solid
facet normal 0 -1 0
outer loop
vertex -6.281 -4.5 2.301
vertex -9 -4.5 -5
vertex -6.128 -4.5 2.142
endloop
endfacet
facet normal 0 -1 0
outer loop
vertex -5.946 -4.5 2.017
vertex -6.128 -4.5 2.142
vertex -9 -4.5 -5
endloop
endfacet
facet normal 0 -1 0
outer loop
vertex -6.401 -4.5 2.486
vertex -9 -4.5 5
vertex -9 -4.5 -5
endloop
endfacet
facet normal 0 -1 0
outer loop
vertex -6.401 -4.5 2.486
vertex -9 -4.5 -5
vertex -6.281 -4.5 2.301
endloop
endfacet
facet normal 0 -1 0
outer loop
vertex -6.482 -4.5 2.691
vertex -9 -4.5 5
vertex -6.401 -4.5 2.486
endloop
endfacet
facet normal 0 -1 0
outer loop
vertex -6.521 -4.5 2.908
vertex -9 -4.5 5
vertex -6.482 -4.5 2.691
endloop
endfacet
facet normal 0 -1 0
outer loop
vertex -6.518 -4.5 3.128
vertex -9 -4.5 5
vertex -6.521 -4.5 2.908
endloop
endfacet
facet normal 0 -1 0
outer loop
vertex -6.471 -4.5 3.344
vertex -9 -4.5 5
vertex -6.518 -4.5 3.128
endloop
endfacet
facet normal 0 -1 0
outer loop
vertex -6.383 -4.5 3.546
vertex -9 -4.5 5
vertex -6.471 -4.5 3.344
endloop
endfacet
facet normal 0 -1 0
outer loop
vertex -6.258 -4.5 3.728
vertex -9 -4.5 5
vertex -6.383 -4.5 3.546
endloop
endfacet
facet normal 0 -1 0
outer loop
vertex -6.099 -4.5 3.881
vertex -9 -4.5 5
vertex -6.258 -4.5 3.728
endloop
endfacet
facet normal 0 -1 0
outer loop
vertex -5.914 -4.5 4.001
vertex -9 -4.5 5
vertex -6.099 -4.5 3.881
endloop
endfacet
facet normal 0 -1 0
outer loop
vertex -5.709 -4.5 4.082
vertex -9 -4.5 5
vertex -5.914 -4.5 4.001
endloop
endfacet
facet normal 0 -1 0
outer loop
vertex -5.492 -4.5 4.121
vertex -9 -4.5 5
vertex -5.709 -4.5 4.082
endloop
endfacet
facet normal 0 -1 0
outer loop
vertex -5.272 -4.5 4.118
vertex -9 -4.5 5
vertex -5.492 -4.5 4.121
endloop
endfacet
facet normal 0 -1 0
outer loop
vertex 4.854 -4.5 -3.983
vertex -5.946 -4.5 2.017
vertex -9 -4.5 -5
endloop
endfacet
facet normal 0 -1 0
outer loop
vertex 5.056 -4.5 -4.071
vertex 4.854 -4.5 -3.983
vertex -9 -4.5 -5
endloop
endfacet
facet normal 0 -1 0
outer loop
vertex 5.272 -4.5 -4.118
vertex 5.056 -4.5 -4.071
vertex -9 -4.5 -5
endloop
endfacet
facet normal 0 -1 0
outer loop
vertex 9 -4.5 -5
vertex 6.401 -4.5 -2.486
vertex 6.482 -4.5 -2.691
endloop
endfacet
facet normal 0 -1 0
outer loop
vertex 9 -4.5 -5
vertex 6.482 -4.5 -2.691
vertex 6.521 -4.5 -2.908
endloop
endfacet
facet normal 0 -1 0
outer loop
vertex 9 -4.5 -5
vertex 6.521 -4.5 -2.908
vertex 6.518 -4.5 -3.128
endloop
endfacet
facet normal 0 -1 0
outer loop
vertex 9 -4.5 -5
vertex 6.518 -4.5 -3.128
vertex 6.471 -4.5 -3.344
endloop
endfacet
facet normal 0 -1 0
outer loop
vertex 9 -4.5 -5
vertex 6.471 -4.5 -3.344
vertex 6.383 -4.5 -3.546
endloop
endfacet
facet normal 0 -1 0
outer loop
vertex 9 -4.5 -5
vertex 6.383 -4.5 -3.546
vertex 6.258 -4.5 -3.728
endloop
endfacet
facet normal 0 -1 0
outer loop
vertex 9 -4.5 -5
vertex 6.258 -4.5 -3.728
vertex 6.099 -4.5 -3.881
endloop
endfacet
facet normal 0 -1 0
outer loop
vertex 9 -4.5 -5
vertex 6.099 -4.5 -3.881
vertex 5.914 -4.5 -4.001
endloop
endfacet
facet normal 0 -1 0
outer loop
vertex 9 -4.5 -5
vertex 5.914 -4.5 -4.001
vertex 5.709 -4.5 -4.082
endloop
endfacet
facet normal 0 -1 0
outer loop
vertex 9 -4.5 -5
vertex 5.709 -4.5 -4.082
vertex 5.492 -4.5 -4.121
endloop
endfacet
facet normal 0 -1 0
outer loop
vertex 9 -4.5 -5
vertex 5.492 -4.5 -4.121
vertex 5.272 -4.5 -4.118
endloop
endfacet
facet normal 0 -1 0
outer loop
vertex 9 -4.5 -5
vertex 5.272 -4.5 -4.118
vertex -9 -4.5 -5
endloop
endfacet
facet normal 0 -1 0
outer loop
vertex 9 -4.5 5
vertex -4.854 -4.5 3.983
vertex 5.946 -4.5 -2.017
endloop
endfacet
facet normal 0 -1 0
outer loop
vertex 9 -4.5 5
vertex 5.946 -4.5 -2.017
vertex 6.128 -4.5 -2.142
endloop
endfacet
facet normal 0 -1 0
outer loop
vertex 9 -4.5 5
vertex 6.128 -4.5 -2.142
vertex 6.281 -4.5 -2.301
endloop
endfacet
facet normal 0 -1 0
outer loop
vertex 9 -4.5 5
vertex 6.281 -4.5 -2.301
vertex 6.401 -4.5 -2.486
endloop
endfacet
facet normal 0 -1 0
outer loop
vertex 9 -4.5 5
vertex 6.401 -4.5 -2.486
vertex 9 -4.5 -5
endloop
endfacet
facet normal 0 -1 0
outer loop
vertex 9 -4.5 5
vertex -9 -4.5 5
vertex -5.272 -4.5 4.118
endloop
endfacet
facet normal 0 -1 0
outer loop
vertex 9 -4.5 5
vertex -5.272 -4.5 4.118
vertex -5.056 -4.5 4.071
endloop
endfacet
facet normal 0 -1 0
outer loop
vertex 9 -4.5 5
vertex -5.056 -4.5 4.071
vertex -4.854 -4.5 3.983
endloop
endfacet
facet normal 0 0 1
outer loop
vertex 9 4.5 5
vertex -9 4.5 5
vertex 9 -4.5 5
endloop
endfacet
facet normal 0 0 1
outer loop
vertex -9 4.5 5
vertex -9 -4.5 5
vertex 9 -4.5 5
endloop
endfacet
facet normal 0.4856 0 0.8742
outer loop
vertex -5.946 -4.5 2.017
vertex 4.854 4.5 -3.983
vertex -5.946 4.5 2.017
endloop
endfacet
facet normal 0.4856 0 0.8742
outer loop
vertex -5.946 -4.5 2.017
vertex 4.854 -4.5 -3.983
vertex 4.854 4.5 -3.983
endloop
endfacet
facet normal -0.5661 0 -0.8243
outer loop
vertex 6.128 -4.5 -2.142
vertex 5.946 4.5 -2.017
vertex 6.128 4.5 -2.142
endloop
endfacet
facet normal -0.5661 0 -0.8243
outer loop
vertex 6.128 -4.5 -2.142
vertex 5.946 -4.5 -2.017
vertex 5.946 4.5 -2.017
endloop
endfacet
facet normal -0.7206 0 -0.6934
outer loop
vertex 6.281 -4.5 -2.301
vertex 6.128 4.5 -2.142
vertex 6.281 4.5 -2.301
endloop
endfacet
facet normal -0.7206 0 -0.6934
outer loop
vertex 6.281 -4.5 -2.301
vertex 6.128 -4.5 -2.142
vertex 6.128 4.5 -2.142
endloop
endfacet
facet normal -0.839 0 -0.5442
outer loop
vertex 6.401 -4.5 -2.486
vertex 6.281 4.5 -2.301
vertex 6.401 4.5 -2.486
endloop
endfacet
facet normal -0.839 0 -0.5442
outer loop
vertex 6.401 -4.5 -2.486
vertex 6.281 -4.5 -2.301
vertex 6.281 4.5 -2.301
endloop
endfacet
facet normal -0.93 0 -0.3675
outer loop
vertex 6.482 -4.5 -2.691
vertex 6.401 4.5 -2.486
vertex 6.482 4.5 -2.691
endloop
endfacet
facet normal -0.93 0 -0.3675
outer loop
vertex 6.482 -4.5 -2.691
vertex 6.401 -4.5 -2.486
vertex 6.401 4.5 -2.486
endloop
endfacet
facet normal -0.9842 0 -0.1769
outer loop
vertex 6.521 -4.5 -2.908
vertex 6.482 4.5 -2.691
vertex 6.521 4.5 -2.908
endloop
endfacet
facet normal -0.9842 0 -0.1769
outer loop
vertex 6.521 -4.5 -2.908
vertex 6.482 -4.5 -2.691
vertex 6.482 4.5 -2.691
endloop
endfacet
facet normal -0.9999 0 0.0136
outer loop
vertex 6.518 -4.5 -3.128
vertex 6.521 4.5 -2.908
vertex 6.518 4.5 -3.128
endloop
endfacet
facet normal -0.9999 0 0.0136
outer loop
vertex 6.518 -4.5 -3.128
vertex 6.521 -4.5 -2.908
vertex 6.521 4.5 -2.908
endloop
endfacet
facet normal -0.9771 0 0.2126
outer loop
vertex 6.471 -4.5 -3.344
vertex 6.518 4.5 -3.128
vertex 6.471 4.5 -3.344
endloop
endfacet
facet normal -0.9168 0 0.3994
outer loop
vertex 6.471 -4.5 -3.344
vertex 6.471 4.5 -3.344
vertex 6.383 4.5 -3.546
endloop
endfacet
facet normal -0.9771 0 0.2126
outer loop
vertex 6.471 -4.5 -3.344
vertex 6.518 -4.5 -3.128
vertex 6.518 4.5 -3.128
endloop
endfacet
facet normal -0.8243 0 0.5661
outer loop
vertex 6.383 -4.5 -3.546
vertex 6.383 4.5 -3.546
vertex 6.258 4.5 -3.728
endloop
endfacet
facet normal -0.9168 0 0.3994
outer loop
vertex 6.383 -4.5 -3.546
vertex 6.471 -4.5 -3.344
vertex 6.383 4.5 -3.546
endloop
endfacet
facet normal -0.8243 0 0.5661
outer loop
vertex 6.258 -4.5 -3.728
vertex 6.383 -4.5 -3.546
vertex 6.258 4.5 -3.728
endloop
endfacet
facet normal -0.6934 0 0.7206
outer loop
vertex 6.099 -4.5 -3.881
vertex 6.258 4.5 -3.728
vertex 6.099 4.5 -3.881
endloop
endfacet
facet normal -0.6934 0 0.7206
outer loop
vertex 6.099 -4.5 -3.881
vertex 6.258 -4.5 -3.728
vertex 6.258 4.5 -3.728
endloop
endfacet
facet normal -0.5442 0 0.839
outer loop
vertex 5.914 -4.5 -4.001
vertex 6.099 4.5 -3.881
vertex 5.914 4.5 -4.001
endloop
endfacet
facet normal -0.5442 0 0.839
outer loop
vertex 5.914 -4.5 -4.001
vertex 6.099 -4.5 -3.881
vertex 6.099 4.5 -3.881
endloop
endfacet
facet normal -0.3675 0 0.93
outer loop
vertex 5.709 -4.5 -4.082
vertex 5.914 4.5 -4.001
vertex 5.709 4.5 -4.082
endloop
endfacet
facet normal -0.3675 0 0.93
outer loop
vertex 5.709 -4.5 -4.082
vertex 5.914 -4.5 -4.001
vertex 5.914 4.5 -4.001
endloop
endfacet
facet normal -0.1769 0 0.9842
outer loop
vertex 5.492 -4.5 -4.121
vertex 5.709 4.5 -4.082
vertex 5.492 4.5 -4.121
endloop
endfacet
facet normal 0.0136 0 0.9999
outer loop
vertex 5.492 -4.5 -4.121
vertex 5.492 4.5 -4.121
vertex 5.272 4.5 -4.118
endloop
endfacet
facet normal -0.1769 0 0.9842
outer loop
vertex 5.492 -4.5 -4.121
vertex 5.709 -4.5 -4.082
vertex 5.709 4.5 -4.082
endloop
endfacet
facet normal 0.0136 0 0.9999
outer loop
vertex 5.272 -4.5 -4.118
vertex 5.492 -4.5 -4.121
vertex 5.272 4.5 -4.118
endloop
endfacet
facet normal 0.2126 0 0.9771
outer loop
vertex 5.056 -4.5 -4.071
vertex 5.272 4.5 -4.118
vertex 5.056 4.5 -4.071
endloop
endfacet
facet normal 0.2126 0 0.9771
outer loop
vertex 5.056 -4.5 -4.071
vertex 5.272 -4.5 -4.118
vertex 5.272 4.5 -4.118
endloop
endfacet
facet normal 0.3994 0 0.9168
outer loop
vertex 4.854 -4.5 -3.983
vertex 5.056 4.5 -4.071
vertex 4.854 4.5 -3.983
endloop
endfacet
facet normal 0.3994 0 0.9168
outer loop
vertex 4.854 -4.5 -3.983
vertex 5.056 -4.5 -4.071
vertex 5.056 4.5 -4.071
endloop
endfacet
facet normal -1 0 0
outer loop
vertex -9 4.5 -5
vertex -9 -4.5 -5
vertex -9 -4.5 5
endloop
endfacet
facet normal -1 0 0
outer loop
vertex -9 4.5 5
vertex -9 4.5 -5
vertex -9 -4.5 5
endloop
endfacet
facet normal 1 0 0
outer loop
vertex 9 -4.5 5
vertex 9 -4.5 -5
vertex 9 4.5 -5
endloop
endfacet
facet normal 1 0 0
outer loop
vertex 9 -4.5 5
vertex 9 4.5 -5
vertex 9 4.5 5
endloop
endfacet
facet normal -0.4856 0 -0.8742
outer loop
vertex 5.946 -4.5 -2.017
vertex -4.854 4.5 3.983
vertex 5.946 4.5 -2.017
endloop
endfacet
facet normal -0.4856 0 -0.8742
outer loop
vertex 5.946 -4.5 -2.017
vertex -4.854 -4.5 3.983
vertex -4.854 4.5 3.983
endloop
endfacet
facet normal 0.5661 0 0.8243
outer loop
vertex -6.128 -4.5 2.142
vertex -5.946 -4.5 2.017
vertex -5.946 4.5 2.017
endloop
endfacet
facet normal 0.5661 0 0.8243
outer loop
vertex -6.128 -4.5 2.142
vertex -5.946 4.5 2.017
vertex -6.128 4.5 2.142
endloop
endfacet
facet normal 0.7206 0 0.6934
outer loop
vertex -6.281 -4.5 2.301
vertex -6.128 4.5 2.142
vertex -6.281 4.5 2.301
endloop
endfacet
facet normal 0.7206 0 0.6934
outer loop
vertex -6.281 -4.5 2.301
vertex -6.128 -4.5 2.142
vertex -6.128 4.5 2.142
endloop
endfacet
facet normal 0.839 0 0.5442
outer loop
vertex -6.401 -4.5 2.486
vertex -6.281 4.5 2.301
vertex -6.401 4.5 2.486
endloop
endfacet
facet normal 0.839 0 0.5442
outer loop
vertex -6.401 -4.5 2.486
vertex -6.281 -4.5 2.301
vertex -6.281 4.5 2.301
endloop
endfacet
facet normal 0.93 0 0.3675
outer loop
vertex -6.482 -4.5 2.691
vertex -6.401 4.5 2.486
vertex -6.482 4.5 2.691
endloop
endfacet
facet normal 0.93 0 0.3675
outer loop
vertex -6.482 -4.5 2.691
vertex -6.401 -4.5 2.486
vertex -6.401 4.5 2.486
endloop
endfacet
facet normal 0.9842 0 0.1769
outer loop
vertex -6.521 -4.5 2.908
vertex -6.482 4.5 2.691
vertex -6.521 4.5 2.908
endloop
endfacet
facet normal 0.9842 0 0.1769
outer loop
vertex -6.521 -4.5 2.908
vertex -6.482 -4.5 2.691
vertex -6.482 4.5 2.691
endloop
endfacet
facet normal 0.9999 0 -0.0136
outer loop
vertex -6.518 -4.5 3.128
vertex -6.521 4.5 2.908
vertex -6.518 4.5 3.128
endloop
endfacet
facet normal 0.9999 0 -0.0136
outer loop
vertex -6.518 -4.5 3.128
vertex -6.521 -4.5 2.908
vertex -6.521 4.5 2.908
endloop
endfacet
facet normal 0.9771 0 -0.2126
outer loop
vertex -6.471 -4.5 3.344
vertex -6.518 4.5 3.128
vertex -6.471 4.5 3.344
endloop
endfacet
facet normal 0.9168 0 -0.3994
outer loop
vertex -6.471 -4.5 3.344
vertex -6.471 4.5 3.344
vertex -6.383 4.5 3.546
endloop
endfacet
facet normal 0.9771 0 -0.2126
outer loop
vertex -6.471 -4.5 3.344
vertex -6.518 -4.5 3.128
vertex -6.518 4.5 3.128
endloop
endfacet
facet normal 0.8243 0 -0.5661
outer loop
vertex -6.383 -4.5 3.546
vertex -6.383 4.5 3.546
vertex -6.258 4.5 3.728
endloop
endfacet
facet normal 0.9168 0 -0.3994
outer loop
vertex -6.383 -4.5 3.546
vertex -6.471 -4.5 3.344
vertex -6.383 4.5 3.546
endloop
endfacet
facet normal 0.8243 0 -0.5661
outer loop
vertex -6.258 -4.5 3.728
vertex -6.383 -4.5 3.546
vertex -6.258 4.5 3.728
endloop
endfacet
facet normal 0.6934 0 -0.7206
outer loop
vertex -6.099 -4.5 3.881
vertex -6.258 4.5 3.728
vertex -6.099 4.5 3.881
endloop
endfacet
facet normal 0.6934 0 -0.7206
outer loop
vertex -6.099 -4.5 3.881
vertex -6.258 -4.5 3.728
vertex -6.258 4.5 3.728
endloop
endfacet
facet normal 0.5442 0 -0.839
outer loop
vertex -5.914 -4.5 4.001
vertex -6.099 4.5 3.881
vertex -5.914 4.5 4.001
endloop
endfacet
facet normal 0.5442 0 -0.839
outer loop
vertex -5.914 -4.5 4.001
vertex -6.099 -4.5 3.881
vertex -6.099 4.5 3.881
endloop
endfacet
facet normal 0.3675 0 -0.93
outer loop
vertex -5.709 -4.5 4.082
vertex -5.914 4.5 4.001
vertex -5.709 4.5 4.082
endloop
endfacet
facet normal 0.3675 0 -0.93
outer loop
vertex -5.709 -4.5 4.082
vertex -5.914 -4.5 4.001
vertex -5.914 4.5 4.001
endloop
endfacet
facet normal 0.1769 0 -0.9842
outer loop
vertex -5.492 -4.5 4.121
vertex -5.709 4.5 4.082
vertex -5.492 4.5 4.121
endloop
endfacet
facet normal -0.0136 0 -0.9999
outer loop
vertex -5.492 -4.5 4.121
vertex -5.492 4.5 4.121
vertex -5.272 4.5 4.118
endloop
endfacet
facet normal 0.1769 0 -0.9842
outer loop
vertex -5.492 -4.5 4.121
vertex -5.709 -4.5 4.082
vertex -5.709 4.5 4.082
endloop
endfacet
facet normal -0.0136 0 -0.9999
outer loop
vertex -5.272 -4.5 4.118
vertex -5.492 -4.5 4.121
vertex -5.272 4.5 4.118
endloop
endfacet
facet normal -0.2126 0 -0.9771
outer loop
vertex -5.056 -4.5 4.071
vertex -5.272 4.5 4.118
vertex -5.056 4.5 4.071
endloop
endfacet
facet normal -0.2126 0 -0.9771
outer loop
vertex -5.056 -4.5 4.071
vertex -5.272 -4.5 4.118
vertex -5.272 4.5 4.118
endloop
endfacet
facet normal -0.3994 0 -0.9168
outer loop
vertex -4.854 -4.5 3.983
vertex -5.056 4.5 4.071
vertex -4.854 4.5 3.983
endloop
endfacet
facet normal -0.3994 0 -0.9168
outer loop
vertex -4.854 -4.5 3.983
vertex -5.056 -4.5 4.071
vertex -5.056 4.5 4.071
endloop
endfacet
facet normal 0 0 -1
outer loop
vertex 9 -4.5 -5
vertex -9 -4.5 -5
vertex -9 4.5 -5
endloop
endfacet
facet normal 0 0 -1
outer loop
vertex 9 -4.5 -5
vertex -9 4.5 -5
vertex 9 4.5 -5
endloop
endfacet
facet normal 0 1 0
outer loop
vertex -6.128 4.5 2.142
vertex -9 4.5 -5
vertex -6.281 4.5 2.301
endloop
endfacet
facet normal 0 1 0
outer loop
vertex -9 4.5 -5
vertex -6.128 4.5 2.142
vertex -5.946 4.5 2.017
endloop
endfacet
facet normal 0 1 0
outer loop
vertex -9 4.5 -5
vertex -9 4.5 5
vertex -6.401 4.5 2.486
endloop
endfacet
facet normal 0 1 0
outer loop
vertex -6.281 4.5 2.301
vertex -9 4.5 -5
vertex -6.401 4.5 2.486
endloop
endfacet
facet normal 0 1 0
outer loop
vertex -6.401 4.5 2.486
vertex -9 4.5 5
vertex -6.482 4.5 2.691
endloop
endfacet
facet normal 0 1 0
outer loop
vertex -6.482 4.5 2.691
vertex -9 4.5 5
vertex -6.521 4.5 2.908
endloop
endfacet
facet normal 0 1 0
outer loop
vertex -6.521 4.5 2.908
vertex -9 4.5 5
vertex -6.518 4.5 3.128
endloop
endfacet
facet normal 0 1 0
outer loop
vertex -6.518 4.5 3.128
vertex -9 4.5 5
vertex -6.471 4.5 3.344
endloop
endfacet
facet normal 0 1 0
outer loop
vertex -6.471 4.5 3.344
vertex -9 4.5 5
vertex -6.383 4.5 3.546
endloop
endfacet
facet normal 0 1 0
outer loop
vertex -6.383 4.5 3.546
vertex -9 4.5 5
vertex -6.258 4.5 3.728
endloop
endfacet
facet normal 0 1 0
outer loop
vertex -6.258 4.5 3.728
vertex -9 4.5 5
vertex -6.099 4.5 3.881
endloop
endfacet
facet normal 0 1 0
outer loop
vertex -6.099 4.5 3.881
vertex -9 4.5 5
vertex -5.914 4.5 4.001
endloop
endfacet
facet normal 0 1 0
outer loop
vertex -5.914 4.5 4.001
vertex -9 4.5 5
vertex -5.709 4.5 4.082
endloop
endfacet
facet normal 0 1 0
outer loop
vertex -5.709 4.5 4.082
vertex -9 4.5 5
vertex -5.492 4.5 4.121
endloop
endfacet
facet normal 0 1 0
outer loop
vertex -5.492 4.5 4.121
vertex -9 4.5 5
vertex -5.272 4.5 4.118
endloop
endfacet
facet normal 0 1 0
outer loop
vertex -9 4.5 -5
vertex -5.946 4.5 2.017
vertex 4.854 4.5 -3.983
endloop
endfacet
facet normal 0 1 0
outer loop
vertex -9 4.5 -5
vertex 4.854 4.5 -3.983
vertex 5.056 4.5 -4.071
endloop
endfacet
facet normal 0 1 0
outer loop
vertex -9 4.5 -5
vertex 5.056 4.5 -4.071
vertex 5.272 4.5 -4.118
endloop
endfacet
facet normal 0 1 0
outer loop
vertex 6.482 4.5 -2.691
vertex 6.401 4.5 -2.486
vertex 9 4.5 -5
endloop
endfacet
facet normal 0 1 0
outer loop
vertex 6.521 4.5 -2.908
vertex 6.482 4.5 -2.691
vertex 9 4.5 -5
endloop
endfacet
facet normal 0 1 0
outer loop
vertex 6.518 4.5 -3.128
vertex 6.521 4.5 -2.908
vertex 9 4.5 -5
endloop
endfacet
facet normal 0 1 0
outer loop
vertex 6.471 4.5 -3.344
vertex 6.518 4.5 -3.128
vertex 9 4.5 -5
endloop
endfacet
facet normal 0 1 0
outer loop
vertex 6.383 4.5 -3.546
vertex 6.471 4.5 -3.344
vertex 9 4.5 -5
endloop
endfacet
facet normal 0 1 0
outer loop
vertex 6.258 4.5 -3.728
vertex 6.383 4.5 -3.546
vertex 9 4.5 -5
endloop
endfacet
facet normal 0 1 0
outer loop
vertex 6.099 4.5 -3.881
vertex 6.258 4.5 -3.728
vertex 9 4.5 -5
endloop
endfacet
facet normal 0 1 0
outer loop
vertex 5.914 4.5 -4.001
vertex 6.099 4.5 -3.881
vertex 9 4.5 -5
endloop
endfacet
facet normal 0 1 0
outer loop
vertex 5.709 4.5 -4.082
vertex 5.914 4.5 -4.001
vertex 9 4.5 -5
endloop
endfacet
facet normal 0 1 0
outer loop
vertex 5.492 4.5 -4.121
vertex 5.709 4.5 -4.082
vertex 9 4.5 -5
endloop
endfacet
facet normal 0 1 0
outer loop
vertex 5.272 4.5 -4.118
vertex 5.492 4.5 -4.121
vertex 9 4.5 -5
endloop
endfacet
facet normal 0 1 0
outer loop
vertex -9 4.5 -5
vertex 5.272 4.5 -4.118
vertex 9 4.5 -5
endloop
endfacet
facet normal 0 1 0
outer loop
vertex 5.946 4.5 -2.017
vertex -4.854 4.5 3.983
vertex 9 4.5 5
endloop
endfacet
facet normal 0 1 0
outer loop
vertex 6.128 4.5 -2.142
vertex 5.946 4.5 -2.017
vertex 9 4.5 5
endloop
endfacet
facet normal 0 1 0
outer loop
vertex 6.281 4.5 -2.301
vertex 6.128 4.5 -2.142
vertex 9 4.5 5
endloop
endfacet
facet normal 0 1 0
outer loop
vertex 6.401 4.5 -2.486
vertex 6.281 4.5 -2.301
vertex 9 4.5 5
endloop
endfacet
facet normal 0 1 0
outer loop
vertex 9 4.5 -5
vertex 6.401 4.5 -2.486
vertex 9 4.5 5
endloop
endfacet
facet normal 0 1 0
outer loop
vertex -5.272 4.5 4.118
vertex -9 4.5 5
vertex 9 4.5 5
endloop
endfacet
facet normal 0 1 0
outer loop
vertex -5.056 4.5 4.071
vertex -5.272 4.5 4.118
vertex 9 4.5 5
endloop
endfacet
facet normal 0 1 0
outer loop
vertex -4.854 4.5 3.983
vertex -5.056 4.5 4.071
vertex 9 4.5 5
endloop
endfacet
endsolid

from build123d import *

# Parameters (mm, degrees)
F0_W     = 18
F0_H     = 10
F1_DEPTH = 4.5


with BuildPart() as f1:
    # F0 (on Front) → F1 (new body, symmetric)
    with BuildSketch(Plane.XZ):
        Rectangle(F0_W, F0_H)
        with BuildLine():
            ThreePointArc((-5.946348, 2.016573), (-6.383427, 3.546348), (-4.853652, 3.983427))
            Line((-4.853652, 3.983427), (5.946348, -2.016573))
            ThreePointArc((5.946348, -2.016573), (6.383427, -3.546348), (4.853652, -3.983427))
            Line((4.853652, -3.983427), (-5.946348, 2.016573))
        make_face(mode=Mode.SUBTRACT)
    extrude(amount=F1_DEPTH, both=True)


solid = f1.part
